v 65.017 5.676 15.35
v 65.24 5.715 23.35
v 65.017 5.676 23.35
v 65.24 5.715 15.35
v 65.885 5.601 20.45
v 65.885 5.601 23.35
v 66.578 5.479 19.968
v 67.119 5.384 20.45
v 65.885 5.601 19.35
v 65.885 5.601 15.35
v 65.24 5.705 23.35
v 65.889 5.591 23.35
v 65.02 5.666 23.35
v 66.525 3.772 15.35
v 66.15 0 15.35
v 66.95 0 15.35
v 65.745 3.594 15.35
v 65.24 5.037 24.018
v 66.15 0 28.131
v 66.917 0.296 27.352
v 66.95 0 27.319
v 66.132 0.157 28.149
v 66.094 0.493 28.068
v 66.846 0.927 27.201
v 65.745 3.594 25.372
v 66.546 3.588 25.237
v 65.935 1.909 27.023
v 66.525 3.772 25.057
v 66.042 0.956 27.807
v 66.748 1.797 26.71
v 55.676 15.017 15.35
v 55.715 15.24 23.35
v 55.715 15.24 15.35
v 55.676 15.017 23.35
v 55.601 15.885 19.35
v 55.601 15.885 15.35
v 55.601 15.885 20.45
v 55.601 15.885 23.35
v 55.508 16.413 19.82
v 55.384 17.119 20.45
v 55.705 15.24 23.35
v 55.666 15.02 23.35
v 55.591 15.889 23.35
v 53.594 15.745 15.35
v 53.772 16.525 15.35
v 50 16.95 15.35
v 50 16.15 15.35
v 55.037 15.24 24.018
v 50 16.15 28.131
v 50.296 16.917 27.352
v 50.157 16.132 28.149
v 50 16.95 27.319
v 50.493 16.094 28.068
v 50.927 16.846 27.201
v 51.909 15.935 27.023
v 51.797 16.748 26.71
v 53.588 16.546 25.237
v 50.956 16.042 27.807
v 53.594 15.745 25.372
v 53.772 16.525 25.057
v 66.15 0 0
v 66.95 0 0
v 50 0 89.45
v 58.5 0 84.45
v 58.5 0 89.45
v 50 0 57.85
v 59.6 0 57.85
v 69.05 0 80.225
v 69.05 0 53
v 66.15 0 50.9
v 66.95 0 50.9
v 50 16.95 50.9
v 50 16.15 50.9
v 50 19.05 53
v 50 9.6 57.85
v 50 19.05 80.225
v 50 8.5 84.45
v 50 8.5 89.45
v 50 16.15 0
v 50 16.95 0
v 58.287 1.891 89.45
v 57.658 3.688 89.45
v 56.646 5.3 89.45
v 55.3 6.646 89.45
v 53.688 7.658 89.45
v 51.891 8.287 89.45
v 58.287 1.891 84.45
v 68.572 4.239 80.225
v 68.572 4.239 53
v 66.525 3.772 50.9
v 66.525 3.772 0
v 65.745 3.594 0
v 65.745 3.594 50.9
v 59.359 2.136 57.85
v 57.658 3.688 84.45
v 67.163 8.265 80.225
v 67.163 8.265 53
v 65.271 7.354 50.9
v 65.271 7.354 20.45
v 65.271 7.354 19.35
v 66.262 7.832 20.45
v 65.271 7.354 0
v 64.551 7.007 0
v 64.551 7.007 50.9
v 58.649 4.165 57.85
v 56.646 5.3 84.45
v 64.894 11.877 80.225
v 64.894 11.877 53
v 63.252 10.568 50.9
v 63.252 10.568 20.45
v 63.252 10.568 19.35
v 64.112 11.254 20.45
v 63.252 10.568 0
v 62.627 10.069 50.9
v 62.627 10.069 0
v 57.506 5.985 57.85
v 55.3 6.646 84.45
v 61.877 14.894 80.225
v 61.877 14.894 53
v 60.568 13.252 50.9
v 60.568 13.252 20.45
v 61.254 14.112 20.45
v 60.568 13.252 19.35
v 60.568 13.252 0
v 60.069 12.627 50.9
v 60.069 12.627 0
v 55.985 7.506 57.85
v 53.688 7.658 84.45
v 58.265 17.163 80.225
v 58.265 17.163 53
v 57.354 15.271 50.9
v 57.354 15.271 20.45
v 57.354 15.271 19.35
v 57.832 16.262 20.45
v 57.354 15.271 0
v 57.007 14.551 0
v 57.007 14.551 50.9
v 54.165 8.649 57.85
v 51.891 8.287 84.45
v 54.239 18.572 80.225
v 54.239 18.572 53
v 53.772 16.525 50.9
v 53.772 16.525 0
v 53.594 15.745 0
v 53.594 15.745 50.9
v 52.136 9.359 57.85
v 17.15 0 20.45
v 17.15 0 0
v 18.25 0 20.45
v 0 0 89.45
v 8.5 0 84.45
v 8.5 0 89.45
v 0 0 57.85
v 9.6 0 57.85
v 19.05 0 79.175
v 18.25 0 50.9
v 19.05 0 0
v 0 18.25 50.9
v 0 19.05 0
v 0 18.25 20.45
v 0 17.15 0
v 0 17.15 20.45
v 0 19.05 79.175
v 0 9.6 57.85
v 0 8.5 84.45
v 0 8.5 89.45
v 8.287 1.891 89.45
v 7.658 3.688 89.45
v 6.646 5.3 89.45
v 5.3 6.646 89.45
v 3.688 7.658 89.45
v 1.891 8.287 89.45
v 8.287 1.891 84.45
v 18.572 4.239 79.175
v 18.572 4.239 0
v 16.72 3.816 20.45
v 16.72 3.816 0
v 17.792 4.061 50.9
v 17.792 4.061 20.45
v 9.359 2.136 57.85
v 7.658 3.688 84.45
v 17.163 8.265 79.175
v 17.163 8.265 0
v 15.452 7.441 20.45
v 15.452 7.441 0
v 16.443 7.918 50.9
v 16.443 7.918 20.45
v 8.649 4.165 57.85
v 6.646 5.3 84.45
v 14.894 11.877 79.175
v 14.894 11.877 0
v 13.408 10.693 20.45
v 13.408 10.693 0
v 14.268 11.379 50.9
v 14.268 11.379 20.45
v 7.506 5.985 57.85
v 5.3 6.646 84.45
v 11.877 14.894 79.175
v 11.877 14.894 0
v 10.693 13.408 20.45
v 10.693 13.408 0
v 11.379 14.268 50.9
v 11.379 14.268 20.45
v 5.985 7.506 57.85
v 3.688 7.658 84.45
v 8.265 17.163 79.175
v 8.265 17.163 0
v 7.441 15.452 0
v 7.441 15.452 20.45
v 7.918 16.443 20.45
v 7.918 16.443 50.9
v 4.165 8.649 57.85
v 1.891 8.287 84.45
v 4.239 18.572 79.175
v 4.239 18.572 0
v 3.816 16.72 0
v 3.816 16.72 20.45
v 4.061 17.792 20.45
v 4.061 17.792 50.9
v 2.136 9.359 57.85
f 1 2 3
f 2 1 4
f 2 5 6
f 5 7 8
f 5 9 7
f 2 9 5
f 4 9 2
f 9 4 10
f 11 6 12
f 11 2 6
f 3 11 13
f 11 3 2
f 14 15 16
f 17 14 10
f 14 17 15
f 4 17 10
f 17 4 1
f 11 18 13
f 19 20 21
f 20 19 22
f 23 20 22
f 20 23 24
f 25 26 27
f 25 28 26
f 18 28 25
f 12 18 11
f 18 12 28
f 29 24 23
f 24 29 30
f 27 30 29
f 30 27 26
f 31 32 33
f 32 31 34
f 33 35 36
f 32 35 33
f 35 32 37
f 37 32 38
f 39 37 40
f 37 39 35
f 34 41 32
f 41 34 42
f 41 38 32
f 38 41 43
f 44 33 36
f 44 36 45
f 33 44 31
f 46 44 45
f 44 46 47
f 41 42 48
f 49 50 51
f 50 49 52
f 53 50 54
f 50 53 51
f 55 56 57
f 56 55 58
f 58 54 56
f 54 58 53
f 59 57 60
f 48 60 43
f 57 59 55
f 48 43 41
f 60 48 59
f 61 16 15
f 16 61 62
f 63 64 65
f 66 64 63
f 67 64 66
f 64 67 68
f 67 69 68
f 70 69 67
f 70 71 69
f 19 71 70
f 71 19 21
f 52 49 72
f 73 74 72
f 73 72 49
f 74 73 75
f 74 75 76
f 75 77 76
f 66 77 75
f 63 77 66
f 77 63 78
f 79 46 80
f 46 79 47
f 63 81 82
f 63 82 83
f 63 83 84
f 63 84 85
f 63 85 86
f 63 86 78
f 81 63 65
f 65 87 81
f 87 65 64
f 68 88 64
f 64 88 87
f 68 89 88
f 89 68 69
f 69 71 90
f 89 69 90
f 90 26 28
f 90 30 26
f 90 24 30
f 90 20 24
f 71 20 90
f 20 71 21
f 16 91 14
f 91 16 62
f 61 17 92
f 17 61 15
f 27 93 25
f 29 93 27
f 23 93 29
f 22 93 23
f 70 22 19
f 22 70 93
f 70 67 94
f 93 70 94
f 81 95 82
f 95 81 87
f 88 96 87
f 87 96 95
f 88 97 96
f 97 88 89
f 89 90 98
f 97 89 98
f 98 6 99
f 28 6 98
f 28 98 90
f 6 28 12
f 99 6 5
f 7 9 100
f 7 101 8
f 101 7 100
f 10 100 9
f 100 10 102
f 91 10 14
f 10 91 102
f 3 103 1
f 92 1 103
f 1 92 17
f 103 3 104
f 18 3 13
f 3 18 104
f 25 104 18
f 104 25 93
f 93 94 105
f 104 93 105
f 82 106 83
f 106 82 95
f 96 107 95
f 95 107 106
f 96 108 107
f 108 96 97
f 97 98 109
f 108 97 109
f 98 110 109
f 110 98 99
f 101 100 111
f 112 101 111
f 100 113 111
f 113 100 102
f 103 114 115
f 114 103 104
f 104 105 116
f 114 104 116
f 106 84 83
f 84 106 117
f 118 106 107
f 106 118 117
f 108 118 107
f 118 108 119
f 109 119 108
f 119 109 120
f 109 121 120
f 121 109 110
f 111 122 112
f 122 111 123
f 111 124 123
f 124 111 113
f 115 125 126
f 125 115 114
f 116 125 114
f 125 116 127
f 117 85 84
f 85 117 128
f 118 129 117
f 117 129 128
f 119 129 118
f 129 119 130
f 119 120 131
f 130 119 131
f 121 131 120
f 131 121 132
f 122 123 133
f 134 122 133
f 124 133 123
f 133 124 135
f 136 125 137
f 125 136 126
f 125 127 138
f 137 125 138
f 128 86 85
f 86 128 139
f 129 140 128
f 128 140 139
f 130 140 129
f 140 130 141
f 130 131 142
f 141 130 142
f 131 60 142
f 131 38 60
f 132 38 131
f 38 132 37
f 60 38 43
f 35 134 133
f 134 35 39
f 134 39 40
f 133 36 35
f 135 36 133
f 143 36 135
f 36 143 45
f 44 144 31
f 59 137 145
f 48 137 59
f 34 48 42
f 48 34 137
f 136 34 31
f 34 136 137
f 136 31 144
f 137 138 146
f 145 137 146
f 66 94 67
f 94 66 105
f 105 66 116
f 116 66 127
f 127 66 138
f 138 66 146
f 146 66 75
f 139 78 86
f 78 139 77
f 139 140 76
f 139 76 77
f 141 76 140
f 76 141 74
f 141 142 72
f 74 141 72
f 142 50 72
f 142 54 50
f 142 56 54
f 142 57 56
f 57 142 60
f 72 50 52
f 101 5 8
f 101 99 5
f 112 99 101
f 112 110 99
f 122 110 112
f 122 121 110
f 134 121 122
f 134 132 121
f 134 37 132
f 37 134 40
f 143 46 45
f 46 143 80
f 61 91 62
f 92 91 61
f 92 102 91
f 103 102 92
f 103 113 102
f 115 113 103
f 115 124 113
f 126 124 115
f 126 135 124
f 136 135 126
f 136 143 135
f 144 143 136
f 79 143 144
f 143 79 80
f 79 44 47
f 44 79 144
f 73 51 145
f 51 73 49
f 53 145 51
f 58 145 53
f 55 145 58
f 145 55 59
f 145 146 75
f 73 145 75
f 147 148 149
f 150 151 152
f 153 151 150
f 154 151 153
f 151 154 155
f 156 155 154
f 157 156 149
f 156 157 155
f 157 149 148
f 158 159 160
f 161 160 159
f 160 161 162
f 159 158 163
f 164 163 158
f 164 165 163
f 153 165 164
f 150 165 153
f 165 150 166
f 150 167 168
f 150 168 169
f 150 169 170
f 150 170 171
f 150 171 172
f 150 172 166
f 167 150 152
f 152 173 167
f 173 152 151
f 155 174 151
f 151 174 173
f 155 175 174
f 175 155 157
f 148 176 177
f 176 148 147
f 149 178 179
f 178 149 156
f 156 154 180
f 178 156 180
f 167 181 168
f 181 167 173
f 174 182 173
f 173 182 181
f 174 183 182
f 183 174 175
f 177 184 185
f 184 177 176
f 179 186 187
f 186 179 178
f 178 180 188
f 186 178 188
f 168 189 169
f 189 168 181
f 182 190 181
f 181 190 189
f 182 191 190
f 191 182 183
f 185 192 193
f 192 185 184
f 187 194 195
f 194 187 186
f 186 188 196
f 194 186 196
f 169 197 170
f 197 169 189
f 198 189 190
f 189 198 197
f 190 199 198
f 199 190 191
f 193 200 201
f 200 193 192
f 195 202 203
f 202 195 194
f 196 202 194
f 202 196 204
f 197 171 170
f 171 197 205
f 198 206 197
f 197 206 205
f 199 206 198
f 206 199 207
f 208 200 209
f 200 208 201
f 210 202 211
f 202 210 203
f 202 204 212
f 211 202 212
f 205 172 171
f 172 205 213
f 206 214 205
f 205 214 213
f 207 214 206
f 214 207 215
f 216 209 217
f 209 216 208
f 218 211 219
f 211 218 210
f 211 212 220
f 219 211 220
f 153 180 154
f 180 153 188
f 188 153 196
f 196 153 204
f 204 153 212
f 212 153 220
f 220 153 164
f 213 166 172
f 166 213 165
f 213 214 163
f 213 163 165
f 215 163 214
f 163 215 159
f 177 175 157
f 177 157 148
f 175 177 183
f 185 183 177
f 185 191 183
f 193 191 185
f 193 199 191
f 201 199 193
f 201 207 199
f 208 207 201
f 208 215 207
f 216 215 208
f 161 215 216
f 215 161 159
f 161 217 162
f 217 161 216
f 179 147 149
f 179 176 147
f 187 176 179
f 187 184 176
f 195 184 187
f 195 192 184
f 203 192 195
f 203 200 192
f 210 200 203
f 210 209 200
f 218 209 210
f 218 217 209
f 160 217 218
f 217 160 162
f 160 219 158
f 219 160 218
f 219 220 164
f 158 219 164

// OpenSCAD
/* chosen special dimensions, mm */
p_clearance = 0.2;
p_hook_depth = p_clearance + 0.9;
p_slope = 1.0;

/* chosen dimensions, mm */
p_outer_diameter = 38.1;
p_shoulder_diameter = 17;
p_shoulder_length = 5;
p_max_barrel_length = 128;
p_min_barrel_length = p_max_barrel_length - 10;
p_spring_rest_length = 77;
p_spring_diameter = 19 + p_clearance;
p_wall_thick = 0.8;
p_tab_length = 4;
p_tab_cut = p_outer_diameter * 0.3;

// intermediate useful quantities
inner_outer_diameter = p_outer_diameter - (p_wall_thick + p_hook_depth + p_clearance) * 2;
spring_flat_half_length = p_spring_rest_length / 2;
spring_taper_half_length = spring_flat_half_length - p_slope * (inner_outer_diameter - p_wall_thick - p_spring_diameter)/2;
compression_length = p_max_barrel_length - p_min_barrel_length;
echo(compression_length);

// z-length of the hook
hook_length = p_hook_depth / p_slope;
// length of one half up to the hook
visible_shell_length = p_max_barrel_length / 2 + p_hook_depth;
// length of one half behind the hook
hidden_shell_length = spring_taper_half_length - compression_length - hook_length * 2;

hook_z = hidden_shell_length;
shell_end_z = visible_shell_length + hidden_shell_length;
spring_flat_z = hook_z + spring_flat_half_length;
spring_taper_z = hook_z + spring_taper_half_length;

if (false) {
    clearance_test();
} else {
    difference() {
        printing_parts();
        *cube([1000, 1000, 1000]);
    }
}

module clearance_test() {
    difference() {
        union() {
            assembled(0);
            translate([0, p_outer_diameter * 2, 0]) assembled(compression_length / 2);
        }
        
        translate([0, -500, -500])
        cube([1000, 1000, 1000]);

    }
    
    module assembled(compression_half) {
        translate([0, 0, -hidden_shell_length - hook_length - compression_half])
        outer_part();
        
        rotate([0, 180, 0])
        translate([0, 0, -hidden_shell_length - hook_length - compression_half])
        inner_part();
        
    }
}

module printing_parts() {
    outer_part();

    translate([50, 0, 0])
    inner_part();
}

module outer_part() {
    roll_3d(p_outer_diameter, hook_outer=false);
}

module inner_part() {
    roll_3d(inner_outer_diameter, hook_outer=true);
}

module roll_3d(outer_diameter, hook_outer) {
    difference() {
        rotate_extrude(angle=90)
        roll_hollowed(outer_diameter, hook_outer);
        
        if (hook_outer) {
            cut_z = hook_z + p_tab_length;
            cut_dia = p_tab_cut;
            for (i = [0:3]) {
                rotate([0, 0, i * 90])
                translate([0, -p_outer_diameter * 0.4, hook_z]) {
                    cylinder(d=cut_dia, h=p_tab_length*2, center=true);
                    translate([0, 0, p_tab_length - 0.01])
                    cylinder(d1=cut_dia, d2=0, h=cut_dia / 2);
                }
            }
        }
    }
}

module roll_hollowed(outer_diameter, hook_outer=false) {
    difference() {
        roll_polygon(outer_diameter, slope=p_slope / 2, hook=hook_outer);
        interior_polygon(outer_diameter, hook=!hook_outer);
    }
}

module roll_polygon(outer_diameter, slope, hook=false) {
    end_slope_z = shell_end_z - slope * (outer_diameter - p_shoulder_diameter)/2;
    polygon([
        [0, 0],
        [outer_diameter/2, 0],
        [outer_diameter/2, hook_z],
        [outer_diameter/2 + (hook?1:0) * p_hook_depth, hook_z + hook_length],
        [outer_diameter/2, hook_z + hook_length],
        // spring_taper_z is the same as how far the parts slide together
        [outer_diameter/2, spring_taper_z],
        [p_outer_diameter/2, spring_taper_z + (p_outer_diameter - outer_diameter)/2],
        [p_outer_diameter/2, end_slope_z],
        [p_shoulder_diameter/2, shell_end_z],
        [p_shoulder_diameter/2, shell_end_z + p_shoulder_length],
        [0, shell_end_z + p_shoulder_length],
    ]);  
}

module interior_polygon(outer_diameter, hook=false) {
    inner_r = outer_diameter/2 - p_wall_thick;
    bottomz = hook_z + (hook ? -1 : p_wall_thick);
    hook_inset = (hook?1:0) * p_hook_depth;
    polygon([
        [0, 0],
        [inner_r - hook_inset, 0],
        [inner_r - hook_inset, max(0, bottomz)],
        [inner_r - hook_inset, hook_z + hook_length],
        [inner_r, hook_z + hook_length],
        [inner_r, spring_taper_z],
        [p_spring_diameter / 2, spring_flat_z],
        [0, spring_flat_z],
    ]);  
}
